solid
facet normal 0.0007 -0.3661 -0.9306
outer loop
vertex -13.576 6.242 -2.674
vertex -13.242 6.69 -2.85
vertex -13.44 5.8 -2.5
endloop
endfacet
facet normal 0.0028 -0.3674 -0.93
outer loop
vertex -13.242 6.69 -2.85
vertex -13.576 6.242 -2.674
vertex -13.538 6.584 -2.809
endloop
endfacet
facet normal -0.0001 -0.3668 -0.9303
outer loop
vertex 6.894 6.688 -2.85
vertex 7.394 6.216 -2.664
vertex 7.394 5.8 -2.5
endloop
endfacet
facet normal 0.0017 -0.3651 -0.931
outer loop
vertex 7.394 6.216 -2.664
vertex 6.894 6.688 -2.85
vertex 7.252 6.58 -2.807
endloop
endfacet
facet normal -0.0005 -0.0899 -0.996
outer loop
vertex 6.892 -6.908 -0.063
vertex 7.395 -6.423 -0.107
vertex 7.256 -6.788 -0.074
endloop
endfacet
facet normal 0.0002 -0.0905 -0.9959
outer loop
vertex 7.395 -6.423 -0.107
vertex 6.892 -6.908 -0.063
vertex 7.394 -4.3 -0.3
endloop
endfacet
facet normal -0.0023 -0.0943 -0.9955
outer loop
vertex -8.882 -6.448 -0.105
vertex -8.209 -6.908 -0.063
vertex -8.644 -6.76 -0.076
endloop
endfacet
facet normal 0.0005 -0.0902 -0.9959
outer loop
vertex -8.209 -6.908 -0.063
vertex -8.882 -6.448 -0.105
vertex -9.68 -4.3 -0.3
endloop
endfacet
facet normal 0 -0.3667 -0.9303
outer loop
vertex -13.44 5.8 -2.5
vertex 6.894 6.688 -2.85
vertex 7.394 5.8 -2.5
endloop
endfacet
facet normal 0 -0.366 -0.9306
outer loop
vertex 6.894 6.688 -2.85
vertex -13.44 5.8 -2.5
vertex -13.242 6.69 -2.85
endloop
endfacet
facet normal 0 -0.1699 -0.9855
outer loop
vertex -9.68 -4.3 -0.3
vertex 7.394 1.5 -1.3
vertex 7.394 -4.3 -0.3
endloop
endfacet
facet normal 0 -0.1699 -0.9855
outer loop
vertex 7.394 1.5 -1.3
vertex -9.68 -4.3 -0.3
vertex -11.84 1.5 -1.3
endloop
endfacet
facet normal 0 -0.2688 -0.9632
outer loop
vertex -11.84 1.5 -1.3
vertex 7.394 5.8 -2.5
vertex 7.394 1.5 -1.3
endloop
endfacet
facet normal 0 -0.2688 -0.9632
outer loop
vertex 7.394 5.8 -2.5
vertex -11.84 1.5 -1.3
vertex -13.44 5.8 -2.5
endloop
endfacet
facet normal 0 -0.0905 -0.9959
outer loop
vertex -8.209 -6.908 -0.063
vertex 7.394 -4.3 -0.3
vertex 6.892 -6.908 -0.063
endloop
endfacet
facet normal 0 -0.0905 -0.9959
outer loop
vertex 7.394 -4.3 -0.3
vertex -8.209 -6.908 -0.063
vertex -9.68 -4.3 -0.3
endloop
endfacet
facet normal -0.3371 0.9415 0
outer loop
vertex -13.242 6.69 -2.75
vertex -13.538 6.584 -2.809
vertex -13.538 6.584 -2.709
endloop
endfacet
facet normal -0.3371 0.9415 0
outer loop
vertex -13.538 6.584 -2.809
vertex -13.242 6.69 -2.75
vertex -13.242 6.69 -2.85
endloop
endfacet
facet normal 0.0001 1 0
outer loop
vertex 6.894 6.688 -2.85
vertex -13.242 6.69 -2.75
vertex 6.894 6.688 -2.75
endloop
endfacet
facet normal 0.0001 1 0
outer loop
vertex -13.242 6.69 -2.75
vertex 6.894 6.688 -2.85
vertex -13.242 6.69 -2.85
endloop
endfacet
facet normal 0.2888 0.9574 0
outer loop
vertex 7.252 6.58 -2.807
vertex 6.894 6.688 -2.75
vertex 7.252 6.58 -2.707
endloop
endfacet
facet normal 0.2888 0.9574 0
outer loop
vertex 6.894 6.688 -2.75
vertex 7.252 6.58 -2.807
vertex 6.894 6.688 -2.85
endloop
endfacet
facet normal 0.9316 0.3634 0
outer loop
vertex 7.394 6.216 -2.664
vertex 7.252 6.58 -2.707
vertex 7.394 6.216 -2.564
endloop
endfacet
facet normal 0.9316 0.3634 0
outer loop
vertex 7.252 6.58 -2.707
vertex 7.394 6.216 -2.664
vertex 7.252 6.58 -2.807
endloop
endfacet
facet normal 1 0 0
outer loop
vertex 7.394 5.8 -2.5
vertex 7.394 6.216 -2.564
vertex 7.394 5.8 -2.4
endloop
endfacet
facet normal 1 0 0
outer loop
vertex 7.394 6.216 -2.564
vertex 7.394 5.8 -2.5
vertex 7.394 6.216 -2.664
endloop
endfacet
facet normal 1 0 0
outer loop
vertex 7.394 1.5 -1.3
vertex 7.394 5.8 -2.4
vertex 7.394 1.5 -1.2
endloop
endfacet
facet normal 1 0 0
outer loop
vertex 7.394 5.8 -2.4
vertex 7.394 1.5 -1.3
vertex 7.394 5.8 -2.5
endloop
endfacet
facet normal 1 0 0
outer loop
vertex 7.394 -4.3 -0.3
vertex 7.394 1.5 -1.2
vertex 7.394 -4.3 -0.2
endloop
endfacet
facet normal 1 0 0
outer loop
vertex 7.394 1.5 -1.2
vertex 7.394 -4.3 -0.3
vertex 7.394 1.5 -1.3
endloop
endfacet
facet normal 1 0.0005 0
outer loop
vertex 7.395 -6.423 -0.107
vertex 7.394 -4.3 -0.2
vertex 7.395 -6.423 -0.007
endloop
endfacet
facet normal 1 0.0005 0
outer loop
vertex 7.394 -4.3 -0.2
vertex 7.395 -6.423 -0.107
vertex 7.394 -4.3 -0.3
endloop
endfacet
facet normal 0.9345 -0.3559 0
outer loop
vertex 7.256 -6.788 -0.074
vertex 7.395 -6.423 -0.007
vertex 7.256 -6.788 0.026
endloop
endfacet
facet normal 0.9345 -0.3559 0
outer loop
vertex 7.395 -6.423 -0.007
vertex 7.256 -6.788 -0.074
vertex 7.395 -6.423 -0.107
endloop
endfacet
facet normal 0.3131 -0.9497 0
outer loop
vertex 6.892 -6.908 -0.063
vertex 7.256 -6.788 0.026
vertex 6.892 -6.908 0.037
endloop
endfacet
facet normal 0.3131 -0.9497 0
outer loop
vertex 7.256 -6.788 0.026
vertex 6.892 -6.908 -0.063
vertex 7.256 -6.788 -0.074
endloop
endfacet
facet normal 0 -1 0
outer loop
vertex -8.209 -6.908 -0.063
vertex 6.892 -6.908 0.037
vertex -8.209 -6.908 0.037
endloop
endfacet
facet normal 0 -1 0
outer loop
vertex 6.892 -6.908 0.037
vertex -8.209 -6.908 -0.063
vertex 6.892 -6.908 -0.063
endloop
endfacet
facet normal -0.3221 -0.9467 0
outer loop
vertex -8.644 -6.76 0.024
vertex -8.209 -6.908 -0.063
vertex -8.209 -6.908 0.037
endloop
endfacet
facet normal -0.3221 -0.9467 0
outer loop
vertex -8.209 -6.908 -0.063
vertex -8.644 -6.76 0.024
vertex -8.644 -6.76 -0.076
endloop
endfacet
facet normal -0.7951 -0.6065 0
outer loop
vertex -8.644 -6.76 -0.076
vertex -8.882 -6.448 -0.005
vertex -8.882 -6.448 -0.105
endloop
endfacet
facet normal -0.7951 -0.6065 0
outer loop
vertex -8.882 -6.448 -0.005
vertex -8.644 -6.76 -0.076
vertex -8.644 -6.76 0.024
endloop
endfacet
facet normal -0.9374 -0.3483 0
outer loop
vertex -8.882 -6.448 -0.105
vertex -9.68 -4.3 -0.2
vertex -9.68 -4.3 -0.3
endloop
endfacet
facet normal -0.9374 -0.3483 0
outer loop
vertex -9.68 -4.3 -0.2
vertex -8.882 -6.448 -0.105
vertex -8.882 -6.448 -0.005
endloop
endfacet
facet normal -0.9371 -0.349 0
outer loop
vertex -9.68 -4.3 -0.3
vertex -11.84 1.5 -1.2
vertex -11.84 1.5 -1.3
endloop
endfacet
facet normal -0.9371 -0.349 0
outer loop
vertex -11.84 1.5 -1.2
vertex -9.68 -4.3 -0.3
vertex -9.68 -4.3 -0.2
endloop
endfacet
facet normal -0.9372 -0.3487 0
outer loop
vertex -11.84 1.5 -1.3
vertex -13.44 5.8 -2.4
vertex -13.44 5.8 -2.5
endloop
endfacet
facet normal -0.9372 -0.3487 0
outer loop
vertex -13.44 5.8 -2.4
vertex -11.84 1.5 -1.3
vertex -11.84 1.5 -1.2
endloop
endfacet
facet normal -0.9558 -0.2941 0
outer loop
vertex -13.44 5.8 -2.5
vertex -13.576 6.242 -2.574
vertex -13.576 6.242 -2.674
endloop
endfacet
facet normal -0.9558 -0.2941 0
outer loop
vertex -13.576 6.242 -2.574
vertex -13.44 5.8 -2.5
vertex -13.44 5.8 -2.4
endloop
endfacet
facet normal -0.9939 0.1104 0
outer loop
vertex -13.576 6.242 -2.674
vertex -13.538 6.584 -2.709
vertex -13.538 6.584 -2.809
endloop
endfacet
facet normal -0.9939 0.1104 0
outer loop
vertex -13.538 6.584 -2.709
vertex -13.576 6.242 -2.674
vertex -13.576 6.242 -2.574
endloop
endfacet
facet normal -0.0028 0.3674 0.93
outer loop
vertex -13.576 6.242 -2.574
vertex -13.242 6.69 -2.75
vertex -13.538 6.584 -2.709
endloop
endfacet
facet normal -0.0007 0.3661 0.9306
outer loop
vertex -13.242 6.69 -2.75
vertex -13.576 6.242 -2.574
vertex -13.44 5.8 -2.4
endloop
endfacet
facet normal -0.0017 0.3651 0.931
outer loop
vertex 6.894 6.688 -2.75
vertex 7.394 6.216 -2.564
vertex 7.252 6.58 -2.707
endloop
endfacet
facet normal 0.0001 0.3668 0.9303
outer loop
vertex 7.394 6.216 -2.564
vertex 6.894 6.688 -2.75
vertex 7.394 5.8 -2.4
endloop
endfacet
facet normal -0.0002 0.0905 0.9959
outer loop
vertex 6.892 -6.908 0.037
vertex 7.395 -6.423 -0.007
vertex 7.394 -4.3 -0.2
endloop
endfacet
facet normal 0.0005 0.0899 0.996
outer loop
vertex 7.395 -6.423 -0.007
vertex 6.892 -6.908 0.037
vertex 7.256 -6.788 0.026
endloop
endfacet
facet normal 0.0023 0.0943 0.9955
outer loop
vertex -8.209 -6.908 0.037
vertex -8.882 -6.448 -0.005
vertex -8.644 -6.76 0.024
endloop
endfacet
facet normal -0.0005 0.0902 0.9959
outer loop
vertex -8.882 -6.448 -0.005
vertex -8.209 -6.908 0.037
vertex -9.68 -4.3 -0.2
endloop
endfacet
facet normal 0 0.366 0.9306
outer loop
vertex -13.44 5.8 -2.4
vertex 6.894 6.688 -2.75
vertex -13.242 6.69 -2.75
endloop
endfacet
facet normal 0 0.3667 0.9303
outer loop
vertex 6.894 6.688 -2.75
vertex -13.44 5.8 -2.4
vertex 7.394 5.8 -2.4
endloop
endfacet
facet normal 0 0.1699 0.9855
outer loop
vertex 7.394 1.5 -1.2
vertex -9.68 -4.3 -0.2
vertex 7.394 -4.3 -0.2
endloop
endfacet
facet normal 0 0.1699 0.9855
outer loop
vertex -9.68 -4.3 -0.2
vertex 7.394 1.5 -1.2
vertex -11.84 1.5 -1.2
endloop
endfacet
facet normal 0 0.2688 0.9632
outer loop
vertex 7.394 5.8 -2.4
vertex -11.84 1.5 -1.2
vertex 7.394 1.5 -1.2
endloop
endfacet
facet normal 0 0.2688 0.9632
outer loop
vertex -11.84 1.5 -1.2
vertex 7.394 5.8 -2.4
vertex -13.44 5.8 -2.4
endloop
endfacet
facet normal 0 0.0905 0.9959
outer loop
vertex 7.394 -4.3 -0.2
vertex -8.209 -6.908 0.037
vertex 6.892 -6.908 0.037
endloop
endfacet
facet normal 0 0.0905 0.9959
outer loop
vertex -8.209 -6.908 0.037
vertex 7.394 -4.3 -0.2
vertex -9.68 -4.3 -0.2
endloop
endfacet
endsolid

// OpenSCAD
// file: s/13710ks04.scad
use <../../lib.scad>
function ldraw_lib__s__13710ks04() = [
// 0 ~Sticker Top for Technic Beam  3 with Panel Fairing (Formed)
// 0 Name: s\13710ks04.dat
// 0 Author: Philippe Hurbain [Philo]
// 0 !LDRAW_ORG Subpart UPDATE 2022-03
// 0 !LICENSE Licensed under CC BY 2.0 and CC BY 4.0 : see CAreadme.txt
// 
// 0 BFC CERTIFY CCW
  [0,"BFC","CERTIFY"],
  [0,"BFC","CCW"],
// 
// 0 !HISTORY 2022-05-07 [PTadmin] Official Update 2022-03
// 
// 
// 0 // Top surface
// 
// 4 16 33.94 6.435 15.604 33.845 6.772 16.459 33.105 6.876 16.725 33.6 6 14.5
  [4,16,33.94,6.435,15.604,33.845,6.772,16.459,33.105,6.876,16.725,33.6,6,14.5],
// 4 16 -17.236 6.875 16.721 -18.13 6.768 16.45 -18.484 6.409 15.539 -18.484 6 14.5
  [4,16,-17.236,6.875,16.721,-18.13,6.768,16.45,-18.484,6.409,15.539,-18.484,6,14.5],
// 4 16 -18.487 0.017 -16.058 -18.14 -0.066 -16.971 -17.23 -0.093 -17.27 -18.484 0.5 -10.75
  [4,16,-18.487,0.017,-16.058,-18.14,-0.066,-16.971,-17.23,-0.093,-17.27,-18.484,0.5,-10.75],
// 4 16 20.522 -0.093 -17.269 21.61 -0.059 -16.899 22.205 0.012 -16.121 24.2 0.5 -10.75
  [4,16,20.522,-0.093,-17.269,21.61,-0.059,-16.899,22.205,0.012,-16.121,24.2,0.5,-10.75],
// 4 16 33.6 6 14.5 33.105 6.876 16.725 -17.236 6.875 16.721 -18.484 6 14.5
  [4,16,33.6,6,14.5,33.105,6.876,16.725,-17.236,6.875,16.721,-18.484,6,14.5],
// 4 16 -18.484 0.5 -10.75 24.2 0.5 -10.75 29.6 3 3.75 -18.484 3 3.75
  [4,16,-18.484,0.5,-10.75,24.2,0.5,-10.75,29.6,3,3.75,-18.484,3,3.75],
// 4 16 33.6 6 14.5 -18.484 6 14.5 -18.484 3 3.75 29.6 3 3.75
  [4,16,33.6,6,14.5,-18.484,6,14.5,-18.484,3,3.75,29.6,3,3.75],
// 4 16 24.2 0.5 -10.75 -18.484 0.5 -10.75 -17.23 -0.093 -17.27 20.522 -0.093 -17.269
  [4,16,24.2,0.5,-10.75,-18.484,0.5,-10.75,-17.23,-0.093,-17.27,20.522,-0.093,-17.269],
// 5 24 -18.484 6 14.5 33.6 6 14.5 33.105 6.876 16.725 -18.484 3 3.75
  [5,24,-18.484,6,14.5,33.6,6,14.5,33.105,6.876,16.725,-18.484,3,3.75],
// 5 24 -18.484 0.5 -10.75 24.2 0.5 -10.75 29.6 3 3.75 -17.23 -0.093 -17.27
  [5,24,-18.484,0.5,-10.75,24.2,0.5,-10.75,29.6,3,3.75,-17.23,-0.093,-17.27],
// 5 24 29.6 3 3.75 -18.484 3 3.75 -18.484 0.5 -10.75 33.6 6 14.5
  [5,24,29.6,3,3.75,-18.484,3,3.75,-18.484,0.5,-10.75,33.6,6,14.5],
];
module ldraw_lib__s__13710ks04(step=0, col=false, unit=2/5, alt=false, line=0.2, solid=!$preview)
    makepoly(ldraw_lib__s__13710ks04(), step=step, col=col, unit=unit, alt=alt, line=line, solid=solid);
ldraw_lib__s__13710ks04(line=0.2);
// file: s/13710ks03.scad
use <../../lib.scad>
use <13710ks04.scad>
function ldraw_lib__s__13710ks03() = [
// 0 ~Sticker Bottom for Technic Beam  3 with Panel Fairing (Formed)
// 0 Name: s\13710ks03.dat
// 0 Author: Philippe Hurbain [Philo]
// 0 !LDRAW_ORG Subpart UPDATE 2022-03
// 0 !LICENSE Licensed under CC BY 2.0 and CC BY 4.0 : see CAreadme.txt
// 
// 0 BFC CERTIFY CCW
  [0,"BFC","CERTIFY"],
  [0,"BFC","CCW"],
// 
// 0 !HISTORY 2022-05-07 [PTadmin] Official Update 2022-03
// 
// 
// 0 // Bottom surface
// 
// 0 BFC INVERTNEXT
  [0,"BFC","INVERTNEXT"],
// 1 16 0 0.25 0 1 0 0 0 1 0 0 0 1 s\13710ks04.dat
  [1,16,0,0.25,0,1,0,0,0,1,0,0,0,1, ldraw_lib__s__13710ks04()],
// 0 // Edge surface
// 4 16 33.845 7.022 16.459 33.105 7.126 16.725 33.105 6.876 16.725 33.845 6.772 16.459
  [4,16,33.845,7.022,16.459,33.105,7.126,16.725,33.105,6.876,16.725,33.845,6.772,16.459],
// 4 16 33.105 7.126 16.725 -17.236 7.125 16.721 -17.236 6.875 16.721 33.105 6.876 16.725
  [4,16,33.105,7.126,16.725,-17.236,7.125,16.721,-17.236,6.875,16.721,33.105,6.876,16.725],
// 4 16 -17.236 7.125 16.721 -18.13 7.018 16.45 -18.13 6.768 16.45 -17.236 6.875 16.721
  [4,16,-17.236,7.125,16.721,-18.13,7.018,16.45,-18.13,6.768,16.45,-17.236,6.875,16.721],
// 4 16 -18.13 7.018 16.45 -18.484 6.659 15.539 -18.484 6.409 15.539 -18.13 6.768 16.45
  [4,16,-18.13,7.018,16.45,-18.484,6.659,15.539,-18.484,6.409,15.539,-18.13,6.768,16.45],
// 4 16 -18.484 6.659 15.539 -18.484 6.25 14.5 -18.484 6 14.5 -18.484 6.409 15.539
  [4,16,-18.484,6.659,15.539,-18.484,6.25,14.5,-18.484,6,14.5,-18.484,6.409,15.539],
// 4 16 -18.484 6.25 14.5 -18.484 3.25 3.75 -18.484 3 3.75 -18.484 6 14.5
  [4,16,-18.484,6.25,14.5,-18.484,3.25,3.75,-18.484,3,3.75,-18.484,6,14.5],
// 4 16 -18.484 3.25 3.75 -18.484 0.75 -10.75 -18.484 0.5 -10.75 -18.484 3 3.75
  [4,16,-18.484,3.25,3.75,-18.484,0.75,-10.75,-18.484,0.5,-10.75,-18.484,3,3.75],
// 4 16 -18.484 0.75 -10.75 -18.487 0.267 -16.058 -18.487 0.017 -16.058 -18.484 0.5 -10.75
  [4,16,-18.484,0.75,-10.75,-18.487,0.267,-16.058,-18.487,0.017,-16.058,-18.484,0.5,-10.75],
// 4 16 -18.487 0.267 -16.058 -18.14 0.184 -16.971 -18.14 -0.066 -16.971 -18.487 0.017 -16.058
  [4,16,-18.487,0.267,-16.058,-18.14,0.184,-16.971,-18.14,-0.066,-16.971,-18.487,0.017,-16.058],
// 4 16 -18.14 0.184 -16.971 -17.23 0.157 -17.27 -17.23 -0.093 -17.27 -18.14 -0.066 -16.971
  [4,16,-18.14,0.184,-16.971,-17.23,0.157,-17.27,-17.23,-0.093,-17.27,-18.14,-0.066,-16.971],
// 4 16 -17.23 0.157 -17.27 20.522 0.157 -17.269 20.522 -0.093 -17.269 -17.23 -0.093 -17.27
  [4,16,-17.23,0.157,-17.27,20.522,0.157,-17.269,20.522,-0.093,-17.269,-17.23,-0.093,-17.27],
// 4 16 20.522 0.157 -17.269 21.61 0.191 -16.899 21.61 -0.059 -16.899 20.522 -0.093 -17.269
  [4,16,20.522,0.157,-17.269,21.61,0.191,-16.899,21.61,-0.059,-16.899,20.522,-0.093,-17.269],
// 4 16 21.61 0.191 -16.899 22.205 0.262 -16.121 22.205 0.012 -16.121 21.61 -0.059 -16.899
  [4,16,21.61,0.191,-16.899,22.205,0.262,-16.121,22.205,0.012,-16.121,21.61,-0.059,-16.899],
// 4 16 22.205 0.262 -16.121 24.2 0.75 -10.75 24.2 0.5 -10.75 22.205 0.012 -16.121
  [4,16,22.205,0.262,-16.121,24.2,0.75,-10.75,24.2,0.5,-10.75,22.205,0.012,-16.121],
// 4 16 24.2 0.75 -10.75 29.6 3.25 3.75 29.6 3 3.75 24.2 0.5 -10.75
  [4,16,24.2,0.75,-10.75,29.6,3.25,3.75,29.6,3,3.75,24.2,0.5,-10.75],
// 4 16 29.6 3.25 3.75 33.6 6.25 14.5 33.6 6 14.5 29.6 3 3.75
  [4,16,29.6,3.25,3.75,33.6,6.25,14.5,33.6,6,14.5,29.6,3,3.75],
// 4 16 33.6 6.25 14.5 33.94 6.685 15.604 33.94 6.435 15.604 33.6 6 14.5
  [4,16,33.6,6.25,14.5,33.94,6.685,15.604,33.94,6.435,15.604,33.6,6,14.5],
// 4 16 33.94 6.685 15.604 33.845 7.022 16.459 33.845 6.772 16.459 33.94 6.435 15.604
  [4,16,33.94,6.685,15.604,33.845,7.022,16.459,33.845,6.772,16.459,33.94,6.435,15.604],
// 5 24 33.105 7.126 16.725 33.105 6.876 16.725 33.845 7.022 16.459 -17.236 7.125 16.721
  [5,24,33.105,7.126,16.725,33.105,6.876,16.725,33.845,7.022,16.459,-17.236,7.125,16.721],
// 5 24 33.845 6.772 16.459 33.845 7.022 16.459 33.105 7.126 16.725 33.94 6.685 15.604
  [5,24,33.845,6.772,16.459,33.845,7.022,16.459,33.105,7.126,16.725,33.94,6.685,15.604],
// 5 24 -17.236 7.125 16.721 -17.236 6.875 16.721 33.105 7.126 16.725 -18.13 7.018 16.45
  [5,24,-17.236,7.125,16.721,-17.236,6.875,16.721,33.105,7.126,16.725,-18.13,7.018,16.45],
// 5 24 -18.13 7.018 16.45 -18.13 6.768 16.45 -17.236 7.125 16.721 -18.484 6.659 15.539
  [5,24,-18.13,7.018,16.45,-18.13,6.768,16.45,-17.236,7.125,16.721,-18.484,6.659,15.539],
// 5 24 -18.484 6.659 15.539 -18.484 6.409 15.539 -18.13 7.018 16.45 -18.484 6.25 14.5
  [5,24,-18.484,6.659,15.539,-18.484,6.409,15.539,-18.13,7.018,16.45,-18.484,6.25,14.5],
// 5 24 -18.487 0.267 -16.058 -18.487 0.017 -16.058 -18.484 0.75 -10.75 -18.14 0.184 -16.971
  [5,24,-18.487,0.267,-16.058,-18.487,0.017,-16.058,-18.484,0.75,-10.75,-18.14,0.184,-16.971],
// 5 24 -18.14 0.184 -16.971 -18.14 -0.066 -16.971 -18.487 0.267 -16.058 -17.23 0.157 -17.27
  [5,24,-18.14,0.184,-16.971,-18.14,-0.066,-16.971,-18.487,0.267,-16.058,-17.23,0.157,-17.27],
// 5 24 -17.23 0.157 -17.27 -17.23 -0.093 -17.27 -18.14 0.184 -16.971 20.522 0.157 -17.269
  [5,24,-17.23,0.157,-17.27,-17.23,-0.093,-17.27,-18.14,0.184,-16.971,20.522,0.157,-17.269],
// 5 24 20.522 0.157 -17.269 20.522 -0.093 -17.269 -17.23 0.157 -17.27 21.61 0.191 -16.899
  [5,24,20.522,0.157,-17.269,20.522,-0.093,-17.269,-17.23,0.157,-17.27,21.61,0.191,-16.899],
// 5 24 21.61 0.191 -16.899 21.61 -0.059 -16.899 20.522 0.157 -17.269 22.205 0.262 -16.121
  [5,24,21.61,0.191,-16.899,21.61,-0.059,-16.899,20.522,0.157,-17.269,22.205,0.262,-16.121],
// 5 24 22.205 0.262 -16.121 22.205 0.012 -16.121 21.61 0.191 -16.899 24.2 0.75 -10.75
  [5,24,22.205,0.262,-16.121,22.205,0.012,-16.121,21.61,0.191,-16.899,24.2,0.75,-10.75],
// 5 24 33.6 6.25 14.5 33.6 6 14.5 29.6 3.25 3.75 33.94 6.685 15.604
  [5,24,33.6,6.25,14.5,33.6,6,14.5,29.6,3.25,3.75,33.94,6.685,15.604],
// 5 24 33.94 6.685 15.604 33.94 6.435 15.604 33.6 6.25 14.5 33.845 7.022 16.459
  [5,24,33.94,6.685,15.604,33.94,6.435,15.604,33.6,6.25,14.5,33.845,7.022,16.459],
];
module ldraw_lib__s__13710ks03(step=0, col=false, unit=2/5, alt=false, line=0.2, solid=!$preview)
    makepoly(ldraw_lib__s__13710ks03(), step=step, col=col, unit=unit, alt=alt, line=line, solid=solid);
ldraw_lib__s__13710ks03(line=0.2);
// main file
use <../lib.scad>
use <s/13710ks03.scad>
use <s/13710ks04.scad>
function ldraw_lib__13710kc01() = [
// 0 Sticker Mindstorms EV3 #12 for Beam 3 / Fairing Right (Formed) (Needs Work)
// 0 Name: 13710kc01.dat
// 0 Author: Philippe Hurbain [Philo]
// 0 !LDRAW_ORG Part UPDATE 2022-03
// 0 !LICENSE Licensed under CC BY 2.0 and CC BY 4.0 : see CAreadme.txt
// 
// 0 !HELP To be used with panel 61070
// 0 !HELP 1 15 -20 30 -65 1 0 0 0 0 -1 0 1 0 13710kc01.dat
// 
// 0 BFC CERTIFY CCW
  [0,"BFC","CERTIFY"],
  [0,"BFC","CCW"],
// 
// 0 !HISTORY 2022-05-07 [PTadmin] Official Update 2022-03
// 
// 
// 0 // Image file courtesy of the LEGO MINDSTORMS Team
// 0 // Needs Work: Missing more detailed fallback pattern
// 
// 1 16 0 0 0 -1 0 0 0 1 0 0 0 1 s\13710ks03.dat
  [1,16,0,0,0,-1,0,0,0,1,0,0,0,1, ldraw_lib__s__13710ks03()],
// 0 !TEXMAP START PLANAR -33.94 10 16.725 18.484 10 16.725 -33.94 10 -17.27 13710k.png
// 0 !: 1 15 0 0 0 -1 0 0 0 1 0 0 0 1 s\13710ks04.dat
// 0 !TEXMAP FALLBACK
// 1 15 0 0 0 -1 0 0 0 1 0 0 0 1 s\13710ks04.dat
  [1,15,0,0,0,-1,0,0,0,1,0,0,0,1, ldraw_lib__s__13710ks04()],
// 0 !TEXMAP END
];
module ldraw_lib__13710kc01(step=0, col=false, unit=2/5, alt=false, line=0.2, solid=!$preview)
    makepoly(ldraw_lib__13710kc01(), step=step, col=col, unit=unit, alt=alt, line=line, solid=solid);
ldraw_lib__13710kc01(line=0.2);
